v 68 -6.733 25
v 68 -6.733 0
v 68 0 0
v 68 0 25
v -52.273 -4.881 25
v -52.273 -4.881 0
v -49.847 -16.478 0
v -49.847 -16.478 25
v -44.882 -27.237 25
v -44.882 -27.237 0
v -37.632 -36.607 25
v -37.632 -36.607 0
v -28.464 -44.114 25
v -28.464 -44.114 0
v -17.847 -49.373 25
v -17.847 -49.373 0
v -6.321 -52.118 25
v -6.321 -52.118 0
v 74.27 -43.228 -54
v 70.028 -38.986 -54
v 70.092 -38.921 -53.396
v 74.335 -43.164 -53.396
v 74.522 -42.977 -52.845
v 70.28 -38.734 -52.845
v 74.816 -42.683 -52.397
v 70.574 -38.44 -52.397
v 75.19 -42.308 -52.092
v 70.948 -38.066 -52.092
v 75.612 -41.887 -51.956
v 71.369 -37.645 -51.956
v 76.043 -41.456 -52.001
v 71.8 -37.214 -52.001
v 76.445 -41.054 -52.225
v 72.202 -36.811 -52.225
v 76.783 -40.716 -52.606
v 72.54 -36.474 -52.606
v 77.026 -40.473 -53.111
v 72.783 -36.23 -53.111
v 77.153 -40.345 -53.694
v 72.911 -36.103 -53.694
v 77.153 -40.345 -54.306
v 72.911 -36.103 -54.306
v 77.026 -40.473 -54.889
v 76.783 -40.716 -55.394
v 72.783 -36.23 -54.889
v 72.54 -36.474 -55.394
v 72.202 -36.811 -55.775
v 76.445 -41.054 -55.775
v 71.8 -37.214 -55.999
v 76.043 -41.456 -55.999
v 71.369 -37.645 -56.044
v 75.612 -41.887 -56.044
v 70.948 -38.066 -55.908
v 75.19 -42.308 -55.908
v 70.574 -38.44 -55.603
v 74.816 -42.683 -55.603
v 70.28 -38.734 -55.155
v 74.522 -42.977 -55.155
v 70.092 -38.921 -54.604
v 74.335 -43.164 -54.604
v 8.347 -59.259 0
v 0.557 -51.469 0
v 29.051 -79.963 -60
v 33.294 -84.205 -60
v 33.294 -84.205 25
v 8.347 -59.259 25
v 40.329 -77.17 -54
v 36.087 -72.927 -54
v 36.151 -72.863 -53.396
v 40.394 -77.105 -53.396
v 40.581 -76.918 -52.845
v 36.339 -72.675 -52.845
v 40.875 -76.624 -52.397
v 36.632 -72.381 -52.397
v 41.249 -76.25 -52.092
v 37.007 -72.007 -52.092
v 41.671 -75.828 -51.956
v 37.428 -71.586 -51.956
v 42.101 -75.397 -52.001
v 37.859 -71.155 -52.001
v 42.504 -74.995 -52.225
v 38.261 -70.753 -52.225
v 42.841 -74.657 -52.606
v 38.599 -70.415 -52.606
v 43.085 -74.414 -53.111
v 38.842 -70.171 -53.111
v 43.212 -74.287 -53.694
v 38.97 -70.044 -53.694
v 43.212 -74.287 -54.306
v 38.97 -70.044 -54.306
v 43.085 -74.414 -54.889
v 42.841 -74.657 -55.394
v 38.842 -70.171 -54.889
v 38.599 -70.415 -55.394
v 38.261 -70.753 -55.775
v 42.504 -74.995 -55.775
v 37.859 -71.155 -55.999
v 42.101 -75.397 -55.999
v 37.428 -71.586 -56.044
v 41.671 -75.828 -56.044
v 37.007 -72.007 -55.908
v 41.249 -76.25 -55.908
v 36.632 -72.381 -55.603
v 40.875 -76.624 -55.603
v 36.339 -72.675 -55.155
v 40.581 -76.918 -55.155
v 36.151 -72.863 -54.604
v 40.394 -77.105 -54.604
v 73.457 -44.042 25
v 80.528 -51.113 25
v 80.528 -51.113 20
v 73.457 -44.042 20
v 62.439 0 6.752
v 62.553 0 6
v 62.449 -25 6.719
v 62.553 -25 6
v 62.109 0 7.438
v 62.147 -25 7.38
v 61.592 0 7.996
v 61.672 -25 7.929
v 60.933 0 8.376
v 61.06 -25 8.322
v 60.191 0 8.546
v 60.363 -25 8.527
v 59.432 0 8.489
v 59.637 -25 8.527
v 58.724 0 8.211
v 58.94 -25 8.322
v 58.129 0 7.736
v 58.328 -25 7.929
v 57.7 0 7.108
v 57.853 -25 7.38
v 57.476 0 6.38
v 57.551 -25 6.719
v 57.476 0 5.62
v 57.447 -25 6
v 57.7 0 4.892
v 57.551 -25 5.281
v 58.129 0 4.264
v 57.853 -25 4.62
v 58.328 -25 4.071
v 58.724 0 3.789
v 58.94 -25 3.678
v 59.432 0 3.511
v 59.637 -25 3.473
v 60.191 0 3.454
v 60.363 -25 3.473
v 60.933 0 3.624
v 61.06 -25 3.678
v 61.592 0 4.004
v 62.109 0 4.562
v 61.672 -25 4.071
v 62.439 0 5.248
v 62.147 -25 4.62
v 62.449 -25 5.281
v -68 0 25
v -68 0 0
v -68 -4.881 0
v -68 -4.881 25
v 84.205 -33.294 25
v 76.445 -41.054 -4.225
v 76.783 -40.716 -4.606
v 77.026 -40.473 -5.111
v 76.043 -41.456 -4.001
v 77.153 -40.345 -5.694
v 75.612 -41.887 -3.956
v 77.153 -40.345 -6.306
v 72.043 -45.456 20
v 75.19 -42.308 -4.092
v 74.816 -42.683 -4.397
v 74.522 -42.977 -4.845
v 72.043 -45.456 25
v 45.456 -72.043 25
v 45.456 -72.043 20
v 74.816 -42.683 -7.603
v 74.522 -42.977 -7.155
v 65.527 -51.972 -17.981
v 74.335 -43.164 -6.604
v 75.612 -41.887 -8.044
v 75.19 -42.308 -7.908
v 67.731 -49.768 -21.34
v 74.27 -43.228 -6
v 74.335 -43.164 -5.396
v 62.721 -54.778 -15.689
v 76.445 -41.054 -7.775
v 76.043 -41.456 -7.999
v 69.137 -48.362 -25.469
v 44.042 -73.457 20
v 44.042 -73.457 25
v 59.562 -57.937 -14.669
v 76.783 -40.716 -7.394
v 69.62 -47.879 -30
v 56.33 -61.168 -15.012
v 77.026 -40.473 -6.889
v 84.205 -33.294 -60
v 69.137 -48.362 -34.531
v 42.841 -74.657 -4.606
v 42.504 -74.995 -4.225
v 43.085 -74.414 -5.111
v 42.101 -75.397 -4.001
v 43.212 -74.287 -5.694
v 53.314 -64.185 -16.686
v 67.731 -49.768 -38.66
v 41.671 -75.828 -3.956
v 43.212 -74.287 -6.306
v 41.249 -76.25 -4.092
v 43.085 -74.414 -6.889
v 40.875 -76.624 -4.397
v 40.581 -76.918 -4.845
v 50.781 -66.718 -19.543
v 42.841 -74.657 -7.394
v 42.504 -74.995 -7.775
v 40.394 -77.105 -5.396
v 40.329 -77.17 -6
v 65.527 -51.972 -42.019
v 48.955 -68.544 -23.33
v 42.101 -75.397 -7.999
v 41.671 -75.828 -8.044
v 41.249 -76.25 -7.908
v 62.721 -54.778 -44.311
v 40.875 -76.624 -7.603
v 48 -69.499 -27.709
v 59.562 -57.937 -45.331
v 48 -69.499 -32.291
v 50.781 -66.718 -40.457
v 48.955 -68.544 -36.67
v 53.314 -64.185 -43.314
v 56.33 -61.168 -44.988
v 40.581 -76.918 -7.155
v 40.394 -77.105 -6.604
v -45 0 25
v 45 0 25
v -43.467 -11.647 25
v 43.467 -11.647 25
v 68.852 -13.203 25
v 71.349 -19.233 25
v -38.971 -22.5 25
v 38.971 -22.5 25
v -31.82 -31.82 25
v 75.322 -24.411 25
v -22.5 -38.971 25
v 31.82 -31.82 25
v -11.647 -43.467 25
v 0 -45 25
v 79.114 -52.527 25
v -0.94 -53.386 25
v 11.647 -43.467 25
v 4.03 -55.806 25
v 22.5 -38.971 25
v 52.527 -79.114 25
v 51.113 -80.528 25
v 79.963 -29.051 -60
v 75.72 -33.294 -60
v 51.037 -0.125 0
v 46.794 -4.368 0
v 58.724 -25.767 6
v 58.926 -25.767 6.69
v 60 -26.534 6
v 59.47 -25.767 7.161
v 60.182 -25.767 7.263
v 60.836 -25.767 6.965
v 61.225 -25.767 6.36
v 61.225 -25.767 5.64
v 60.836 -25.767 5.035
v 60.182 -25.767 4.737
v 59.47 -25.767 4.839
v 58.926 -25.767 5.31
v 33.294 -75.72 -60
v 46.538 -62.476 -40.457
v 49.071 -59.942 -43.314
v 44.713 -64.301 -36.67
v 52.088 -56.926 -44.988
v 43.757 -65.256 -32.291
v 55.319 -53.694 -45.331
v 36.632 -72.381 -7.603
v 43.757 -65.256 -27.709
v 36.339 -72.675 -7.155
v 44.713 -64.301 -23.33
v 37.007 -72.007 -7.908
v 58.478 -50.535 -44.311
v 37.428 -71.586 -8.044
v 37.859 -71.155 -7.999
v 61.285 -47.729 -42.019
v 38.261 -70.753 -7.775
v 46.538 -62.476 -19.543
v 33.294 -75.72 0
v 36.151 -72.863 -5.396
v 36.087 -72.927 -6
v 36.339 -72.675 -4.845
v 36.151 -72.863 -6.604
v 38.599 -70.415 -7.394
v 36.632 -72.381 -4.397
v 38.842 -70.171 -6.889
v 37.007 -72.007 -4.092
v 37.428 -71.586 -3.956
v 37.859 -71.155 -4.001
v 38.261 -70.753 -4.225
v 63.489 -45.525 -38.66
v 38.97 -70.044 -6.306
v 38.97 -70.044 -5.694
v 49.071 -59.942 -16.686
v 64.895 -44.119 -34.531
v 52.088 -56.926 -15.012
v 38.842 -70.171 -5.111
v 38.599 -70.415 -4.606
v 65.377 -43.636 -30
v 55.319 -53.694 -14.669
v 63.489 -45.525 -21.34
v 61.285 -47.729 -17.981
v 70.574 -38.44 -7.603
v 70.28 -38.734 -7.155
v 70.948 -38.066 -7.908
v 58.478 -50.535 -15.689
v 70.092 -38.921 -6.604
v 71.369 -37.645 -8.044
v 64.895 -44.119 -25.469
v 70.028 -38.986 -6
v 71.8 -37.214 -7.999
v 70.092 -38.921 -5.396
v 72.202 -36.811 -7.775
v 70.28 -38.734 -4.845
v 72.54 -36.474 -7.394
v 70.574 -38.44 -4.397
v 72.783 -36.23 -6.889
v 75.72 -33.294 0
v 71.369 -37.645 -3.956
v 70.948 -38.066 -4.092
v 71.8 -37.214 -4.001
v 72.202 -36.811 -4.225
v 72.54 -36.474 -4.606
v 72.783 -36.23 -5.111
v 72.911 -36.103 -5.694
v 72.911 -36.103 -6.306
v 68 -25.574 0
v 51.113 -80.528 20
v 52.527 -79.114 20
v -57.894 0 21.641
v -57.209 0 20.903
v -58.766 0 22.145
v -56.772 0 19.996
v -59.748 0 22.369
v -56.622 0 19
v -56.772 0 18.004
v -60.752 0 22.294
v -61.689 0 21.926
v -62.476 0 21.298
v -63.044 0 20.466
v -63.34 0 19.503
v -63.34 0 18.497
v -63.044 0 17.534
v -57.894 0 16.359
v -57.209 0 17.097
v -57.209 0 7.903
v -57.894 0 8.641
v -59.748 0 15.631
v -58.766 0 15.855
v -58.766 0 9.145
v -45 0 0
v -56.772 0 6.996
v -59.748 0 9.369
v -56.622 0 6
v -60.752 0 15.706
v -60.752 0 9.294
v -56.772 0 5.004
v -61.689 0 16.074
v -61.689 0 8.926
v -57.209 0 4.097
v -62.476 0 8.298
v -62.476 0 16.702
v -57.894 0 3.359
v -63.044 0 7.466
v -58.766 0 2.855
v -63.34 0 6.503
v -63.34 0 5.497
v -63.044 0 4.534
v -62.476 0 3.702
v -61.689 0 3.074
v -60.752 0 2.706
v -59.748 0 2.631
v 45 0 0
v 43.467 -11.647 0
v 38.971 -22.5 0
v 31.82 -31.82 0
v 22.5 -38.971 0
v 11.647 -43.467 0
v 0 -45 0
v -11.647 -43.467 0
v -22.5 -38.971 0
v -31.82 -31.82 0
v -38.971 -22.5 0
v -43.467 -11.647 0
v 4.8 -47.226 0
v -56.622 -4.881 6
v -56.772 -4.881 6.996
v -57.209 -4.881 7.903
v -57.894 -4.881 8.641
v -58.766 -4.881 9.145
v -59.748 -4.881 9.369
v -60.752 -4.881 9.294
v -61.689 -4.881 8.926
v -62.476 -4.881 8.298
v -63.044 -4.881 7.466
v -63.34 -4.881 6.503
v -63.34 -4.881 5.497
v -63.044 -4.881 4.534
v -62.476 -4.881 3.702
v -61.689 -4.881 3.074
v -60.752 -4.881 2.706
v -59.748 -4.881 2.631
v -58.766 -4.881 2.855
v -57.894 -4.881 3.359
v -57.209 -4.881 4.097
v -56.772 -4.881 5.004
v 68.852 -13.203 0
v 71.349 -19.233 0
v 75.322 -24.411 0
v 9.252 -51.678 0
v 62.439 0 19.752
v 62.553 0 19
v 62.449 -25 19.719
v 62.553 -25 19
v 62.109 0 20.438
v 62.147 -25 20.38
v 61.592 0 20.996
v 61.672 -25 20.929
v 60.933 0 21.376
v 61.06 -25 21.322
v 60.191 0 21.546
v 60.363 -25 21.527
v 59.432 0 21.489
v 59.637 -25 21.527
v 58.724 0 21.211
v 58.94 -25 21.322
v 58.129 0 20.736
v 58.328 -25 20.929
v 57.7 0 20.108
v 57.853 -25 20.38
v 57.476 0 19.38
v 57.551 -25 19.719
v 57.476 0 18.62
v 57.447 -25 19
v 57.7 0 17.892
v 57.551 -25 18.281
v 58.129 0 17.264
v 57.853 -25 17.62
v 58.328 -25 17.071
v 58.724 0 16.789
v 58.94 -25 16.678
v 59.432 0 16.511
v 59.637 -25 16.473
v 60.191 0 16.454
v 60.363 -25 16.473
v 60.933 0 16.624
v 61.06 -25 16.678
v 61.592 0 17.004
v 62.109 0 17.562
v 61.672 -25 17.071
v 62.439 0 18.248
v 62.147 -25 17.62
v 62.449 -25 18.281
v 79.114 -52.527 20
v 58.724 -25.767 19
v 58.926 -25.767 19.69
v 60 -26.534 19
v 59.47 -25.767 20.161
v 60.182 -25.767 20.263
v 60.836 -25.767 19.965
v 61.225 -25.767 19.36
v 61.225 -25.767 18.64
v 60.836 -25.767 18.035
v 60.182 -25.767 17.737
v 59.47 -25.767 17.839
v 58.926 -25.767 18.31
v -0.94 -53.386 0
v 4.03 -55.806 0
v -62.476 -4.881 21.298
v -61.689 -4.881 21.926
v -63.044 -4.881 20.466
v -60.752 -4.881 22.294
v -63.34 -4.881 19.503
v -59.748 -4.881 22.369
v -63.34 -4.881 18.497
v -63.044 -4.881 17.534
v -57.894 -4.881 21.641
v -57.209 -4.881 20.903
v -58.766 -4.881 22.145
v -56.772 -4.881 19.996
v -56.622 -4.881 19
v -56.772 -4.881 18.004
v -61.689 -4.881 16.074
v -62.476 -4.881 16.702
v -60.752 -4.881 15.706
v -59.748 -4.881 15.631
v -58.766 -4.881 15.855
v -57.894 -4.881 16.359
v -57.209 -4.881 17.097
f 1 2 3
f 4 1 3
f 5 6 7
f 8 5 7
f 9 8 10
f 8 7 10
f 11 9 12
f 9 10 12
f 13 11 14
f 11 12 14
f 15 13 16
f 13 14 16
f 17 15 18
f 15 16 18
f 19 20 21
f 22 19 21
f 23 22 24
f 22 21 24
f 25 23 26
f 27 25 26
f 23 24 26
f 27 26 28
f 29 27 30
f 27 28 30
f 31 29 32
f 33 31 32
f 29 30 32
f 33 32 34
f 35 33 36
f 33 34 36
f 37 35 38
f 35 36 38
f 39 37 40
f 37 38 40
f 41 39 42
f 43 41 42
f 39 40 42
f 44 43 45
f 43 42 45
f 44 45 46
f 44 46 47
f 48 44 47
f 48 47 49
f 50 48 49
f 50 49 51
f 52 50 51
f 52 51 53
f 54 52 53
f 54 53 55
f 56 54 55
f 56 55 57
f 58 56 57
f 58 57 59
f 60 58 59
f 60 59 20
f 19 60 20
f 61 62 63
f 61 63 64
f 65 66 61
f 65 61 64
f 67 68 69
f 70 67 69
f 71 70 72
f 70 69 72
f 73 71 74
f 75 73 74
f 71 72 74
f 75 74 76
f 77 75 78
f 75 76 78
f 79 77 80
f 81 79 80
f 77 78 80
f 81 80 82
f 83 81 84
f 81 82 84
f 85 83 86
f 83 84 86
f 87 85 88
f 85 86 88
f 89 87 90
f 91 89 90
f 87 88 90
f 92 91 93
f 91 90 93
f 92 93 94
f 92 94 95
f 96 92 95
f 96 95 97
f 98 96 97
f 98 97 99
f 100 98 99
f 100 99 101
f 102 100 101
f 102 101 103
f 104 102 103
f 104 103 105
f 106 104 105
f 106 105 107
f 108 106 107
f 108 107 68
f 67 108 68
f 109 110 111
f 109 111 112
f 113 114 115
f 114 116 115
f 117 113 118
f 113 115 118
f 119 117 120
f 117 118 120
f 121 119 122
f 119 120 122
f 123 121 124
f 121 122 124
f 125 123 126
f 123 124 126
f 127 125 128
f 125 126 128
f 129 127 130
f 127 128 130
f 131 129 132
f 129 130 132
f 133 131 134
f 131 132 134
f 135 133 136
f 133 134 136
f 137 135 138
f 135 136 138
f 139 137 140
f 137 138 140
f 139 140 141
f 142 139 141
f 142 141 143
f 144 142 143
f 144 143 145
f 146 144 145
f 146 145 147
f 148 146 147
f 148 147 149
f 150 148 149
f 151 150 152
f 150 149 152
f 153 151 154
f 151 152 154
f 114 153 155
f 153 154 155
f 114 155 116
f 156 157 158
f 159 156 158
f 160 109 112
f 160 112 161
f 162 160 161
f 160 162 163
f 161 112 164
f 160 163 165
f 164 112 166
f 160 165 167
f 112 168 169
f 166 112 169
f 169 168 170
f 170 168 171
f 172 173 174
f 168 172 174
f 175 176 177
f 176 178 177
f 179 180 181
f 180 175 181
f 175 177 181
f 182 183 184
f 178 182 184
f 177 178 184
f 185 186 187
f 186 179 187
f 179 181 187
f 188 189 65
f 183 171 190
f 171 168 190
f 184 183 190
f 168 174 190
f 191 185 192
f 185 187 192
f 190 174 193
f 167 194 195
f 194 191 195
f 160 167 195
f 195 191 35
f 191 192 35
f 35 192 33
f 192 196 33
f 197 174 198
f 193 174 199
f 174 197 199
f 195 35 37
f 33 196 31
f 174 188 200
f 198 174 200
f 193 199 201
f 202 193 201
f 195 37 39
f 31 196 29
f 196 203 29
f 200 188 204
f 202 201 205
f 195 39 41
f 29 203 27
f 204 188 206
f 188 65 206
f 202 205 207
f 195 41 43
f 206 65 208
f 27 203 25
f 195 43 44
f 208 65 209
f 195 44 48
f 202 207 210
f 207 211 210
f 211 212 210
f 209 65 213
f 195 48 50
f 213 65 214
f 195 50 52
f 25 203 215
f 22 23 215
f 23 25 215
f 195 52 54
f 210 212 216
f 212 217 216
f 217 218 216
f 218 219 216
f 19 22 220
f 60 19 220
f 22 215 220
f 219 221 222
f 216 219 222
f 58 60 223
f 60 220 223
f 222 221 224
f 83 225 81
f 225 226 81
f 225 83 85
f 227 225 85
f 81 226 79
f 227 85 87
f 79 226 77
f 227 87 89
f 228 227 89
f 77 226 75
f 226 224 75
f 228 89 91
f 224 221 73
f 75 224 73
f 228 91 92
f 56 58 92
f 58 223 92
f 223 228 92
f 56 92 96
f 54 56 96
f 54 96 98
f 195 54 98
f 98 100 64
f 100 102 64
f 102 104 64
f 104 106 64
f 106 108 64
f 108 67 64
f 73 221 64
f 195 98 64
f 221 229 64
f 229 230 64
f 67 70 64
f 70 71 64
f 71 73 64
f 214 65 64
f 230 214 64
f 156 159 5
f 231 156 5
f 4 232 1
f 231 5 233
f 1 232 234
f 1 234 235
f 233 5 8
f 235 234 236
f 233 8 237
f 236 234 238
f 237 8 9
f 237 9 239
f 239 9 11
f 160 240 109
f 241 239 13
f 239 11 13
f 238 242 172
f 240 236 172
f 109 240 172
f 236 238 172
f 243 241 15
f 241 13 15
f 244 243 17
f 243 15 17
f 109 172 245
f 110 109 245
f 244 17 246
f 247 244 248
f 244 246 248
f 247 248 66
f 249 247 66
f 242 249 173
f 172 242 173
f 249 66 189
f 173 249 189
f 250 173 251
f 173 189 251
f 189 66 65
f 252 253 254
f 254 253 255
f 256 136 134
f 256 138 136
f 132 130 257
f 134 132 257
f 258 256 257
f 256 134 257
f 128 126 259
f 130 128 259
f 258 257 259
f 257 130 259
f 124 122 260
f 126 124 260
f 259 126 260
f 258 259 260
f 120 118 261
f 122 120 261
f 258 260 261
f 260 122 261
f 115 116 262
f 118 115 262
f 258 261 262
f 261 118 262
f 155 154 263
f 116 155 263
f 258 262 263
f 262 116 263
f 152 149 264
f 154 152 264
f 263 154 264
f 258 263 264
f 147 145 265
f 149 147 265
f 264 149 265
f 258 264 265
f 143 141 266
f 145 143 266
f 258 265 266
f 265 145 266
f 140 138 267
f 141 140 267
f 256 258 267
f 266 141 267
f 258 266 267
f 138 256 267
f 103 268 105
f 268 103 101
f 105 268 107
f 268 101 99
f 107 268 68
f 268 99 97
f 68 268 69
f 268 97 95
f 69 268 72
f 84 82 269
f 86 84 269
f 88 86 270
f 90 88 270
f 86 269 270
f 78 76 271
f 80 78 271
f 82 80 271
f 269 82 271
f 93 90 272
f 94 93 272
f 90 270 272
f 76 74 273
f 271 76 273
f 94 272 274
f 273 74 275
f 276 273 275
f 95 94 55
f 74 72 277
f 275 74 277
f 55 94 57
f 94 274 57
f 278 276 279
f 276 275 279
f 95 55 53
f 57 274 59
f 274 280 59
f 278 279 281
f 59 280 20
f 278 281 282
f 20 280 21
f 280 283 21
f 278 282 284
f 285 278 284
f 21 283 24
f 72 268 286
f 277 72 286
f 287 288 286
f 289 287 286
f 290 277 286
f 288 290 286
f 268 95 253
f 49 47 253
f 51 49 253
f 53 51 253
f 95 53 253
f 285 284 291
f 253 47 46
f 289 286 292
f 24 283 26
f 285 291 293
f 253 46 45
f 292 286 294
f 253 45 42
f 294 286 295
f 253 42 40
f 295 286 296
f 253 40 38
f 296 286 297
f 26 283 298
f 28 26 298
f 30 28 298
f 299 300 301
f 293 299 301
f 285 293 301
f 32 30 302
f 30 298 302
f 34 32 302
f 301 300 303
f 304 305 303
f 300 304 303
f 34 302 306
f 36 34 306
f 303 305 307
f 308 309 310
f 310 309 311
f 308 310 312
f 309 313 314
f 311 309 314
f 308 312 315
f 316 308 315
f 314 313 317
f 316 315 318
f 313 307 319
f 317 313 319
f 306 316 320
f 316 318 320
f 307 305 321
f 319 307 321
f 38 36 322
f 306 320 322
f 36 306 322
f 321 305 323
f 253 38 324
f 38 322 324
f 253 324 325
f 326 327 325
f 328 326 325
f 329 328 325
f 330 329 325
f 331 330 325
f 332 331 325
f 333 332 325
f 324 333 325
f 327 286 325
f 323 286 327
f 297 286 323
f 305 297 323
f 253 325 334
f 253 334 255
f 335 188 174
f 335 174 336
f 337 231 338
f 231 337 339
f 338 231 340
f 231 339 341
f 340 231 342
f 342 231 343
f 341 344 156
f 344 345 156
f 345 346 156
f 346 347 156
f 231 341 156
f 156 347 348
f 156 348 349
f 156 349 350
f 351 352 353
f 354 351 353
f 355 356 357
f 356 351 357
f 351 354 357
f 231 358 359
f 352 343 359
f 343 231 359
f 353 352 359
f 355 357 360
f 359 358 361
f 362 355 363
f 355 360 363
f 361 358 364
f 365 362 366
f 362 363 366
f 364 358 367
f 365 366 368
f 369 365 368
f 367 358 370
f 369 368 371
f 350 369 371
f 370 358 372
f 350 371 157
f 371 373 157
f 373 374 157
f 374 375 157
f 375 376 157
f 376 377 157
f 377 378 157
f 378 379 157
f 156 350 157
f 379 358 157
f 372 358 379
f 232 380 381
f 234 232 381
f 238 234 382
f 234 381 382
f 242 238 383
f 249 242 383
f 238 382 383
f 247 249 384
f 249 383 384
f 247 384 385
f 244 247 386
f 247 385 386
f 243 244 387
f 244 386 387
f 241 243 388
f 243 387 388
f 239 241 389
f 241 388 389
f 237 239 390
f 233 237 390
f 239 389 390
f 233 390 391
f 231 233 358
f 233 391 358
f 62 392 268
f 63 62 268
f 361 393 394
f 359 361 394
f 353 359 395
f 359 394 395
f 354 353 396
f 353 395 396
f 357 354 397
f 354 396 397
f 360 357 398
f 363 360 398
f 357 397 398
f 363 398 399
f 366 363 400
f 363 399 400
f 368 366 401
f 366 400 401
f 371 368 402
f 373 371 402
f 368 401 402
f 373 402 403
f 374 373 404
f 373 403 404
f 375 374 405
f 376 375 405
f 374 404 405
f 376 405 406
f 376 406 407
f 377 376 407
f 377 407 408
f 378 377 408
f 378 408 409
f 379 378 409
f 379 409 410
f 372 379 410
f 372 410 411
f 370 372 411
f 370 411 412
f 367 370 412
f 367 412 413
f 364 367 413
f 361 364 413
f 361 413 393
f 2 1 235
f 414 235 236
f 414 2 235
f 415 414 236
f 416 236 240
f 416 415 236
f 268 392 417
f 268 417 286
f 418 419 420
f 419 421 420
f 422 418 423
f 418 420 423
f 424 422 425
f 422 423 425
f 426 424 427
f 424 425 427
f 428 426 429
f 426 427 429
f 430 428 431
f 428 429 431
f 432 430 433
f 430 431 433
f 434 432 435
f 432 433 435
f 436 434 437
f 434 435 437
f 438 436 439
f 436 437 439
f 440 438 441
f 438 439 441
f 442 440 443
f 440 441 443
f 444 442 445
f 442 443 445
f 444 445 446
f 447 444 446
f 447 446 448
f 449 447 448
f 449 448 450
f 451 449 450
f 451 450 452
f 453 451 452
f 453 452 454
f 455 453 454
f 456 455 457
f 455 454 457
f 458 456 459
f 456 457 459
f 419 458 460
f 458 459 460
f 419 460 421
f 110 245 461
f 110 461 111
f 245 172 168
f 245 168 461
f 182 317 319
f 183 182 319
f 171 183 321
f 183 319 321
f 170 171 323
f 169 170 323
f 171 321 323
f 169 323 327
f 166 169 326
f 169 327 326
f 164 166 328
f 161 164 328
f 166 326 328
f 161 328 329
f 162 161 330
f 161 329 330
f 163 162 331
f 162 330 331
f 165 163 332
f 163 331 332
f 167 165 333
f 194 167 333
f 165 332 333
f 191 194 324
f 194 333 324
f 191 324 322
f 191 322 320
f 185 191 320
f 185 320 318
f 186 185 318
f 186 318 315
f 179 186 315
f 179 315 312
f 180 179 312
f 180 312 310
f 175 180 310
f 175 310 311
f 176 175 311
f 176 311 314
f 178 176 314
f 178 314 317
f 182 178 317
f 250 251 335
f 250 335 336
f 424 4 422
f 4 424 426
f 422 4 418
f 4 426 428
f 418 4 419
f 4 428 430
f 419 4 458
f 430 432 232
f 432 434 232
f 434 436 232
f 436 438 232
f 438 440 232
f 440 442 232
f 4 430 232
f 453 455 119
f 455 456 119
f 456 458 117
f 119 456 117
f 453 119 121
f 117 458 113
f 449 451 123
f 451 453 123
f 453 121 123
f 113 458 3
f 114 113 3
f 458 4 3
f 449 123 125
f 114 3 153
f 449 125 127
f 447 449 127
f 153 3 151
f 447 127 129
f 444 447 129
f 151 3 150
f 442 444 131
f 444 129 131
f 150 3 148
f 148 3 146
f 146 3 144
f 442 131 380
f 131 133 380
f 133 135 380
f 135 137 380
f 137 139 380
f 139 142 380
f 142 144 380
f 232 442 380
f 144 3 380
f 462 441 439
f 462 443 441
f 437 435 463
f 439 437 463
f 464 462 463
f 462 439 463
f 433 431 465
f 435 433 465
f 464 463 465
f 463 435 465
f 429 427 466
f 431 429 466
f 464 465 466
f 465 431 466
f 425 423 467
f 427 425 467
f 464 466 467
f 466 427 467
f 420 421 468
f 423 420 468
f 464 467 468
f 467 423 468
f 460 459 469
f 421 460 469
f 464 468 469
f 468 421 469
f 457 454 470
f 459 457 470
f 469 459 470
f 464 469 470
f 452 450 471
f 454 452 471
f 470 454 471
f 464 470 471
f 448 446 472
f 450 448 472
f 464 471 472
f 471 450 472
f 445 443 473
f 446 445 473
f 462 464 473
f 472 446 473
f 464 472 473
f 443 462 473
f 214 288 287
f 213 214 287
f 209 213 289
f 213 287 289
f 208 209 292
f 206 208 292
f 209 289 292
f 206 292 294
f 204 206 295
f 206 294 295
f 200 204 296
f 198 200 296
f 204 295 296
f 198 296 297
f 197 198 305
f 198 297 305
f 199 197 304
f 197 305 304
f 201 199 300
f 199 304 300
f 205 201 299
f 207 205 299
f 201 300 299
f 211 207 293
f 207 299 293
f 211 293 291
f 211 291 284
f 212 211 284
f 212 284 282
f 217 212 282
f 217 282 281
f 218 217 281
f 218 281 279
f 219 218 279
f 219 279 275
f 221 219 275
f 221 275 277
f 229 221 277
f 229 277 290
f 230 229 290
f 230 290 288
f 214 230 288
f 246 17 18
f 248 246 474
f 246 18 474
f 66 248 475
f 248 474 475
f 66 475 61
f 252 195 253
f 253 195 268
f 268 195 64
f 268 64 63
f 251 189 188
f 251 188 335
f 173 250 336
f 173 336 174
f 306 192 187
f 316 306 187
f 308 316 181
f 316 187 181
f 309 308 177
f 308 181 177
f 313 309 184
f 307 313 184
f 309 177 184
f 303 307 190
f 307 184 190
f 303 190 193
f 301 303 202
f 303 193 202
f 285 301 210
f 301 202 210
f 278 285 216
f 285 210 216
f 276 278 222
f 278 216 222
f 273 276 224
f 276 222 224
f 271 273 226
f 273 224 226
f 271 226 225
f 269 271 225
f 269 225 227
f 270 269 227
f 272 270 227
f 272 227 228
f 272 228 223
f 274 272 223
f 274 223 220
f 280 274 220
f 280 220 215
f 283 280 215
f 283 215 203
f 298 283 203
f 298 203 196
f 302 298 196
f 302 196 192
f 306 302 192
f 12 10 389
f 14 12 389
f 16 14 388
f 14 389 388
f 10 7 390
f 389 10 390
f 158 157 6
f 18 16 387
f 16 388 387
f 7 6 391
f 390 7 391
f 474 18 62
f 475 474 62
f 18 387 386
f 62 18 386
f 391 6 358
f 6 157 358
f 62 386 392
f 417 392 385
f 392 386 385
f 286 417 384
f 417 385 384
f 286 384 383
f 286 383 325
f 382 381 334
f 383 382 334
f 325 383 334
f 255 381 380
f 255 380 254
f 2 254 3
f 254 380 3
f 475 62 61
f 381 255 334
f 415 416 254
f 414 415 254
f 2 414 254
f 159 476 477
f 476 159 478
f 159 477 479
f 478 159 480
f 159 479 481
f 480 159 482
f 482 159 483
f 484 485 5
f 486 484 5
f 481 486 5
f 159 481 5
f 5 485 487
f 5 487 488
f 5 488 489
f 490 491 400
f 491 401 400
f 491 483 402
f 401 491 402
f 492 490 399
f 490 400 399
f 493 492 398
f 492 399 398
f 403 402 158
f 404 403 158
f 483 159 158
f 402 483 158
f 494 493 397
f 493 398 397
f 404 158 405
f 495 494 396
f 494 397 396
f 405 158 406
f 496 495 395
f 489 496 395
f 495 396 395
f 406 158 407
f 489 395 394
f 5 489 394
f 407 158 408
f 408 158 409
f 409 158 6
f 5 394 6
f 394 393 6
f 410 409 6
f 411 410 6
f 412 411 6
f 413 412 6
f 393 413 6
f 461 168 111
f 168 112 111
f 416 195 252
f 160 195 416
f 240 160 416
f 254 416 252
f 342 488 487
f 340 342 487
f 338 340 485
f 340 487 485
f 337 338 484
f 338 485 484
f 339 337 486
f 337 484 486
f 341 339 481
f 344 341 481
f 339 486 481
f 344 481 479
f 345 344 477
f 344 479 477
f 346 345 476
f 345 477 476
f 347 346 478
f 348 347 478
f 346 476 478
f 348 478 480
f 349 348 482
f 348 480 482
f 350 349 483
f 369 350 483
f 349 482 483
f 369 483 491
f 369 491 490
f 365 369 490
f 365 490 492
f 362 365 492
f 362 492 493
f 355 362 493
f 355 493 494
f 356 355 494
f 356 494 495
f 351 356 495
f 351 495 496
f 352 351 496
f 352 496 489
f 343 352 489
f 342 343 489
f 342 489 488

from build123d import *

# Parameters (mm, degrees)
F1_DEPTH  = 25
F3_DEPTH  = 60
F4_R      = 15.3734931233
F5_DEPTH  = 131.1684809697
F8_DEPTH  = 6
F10_DEPTH = 6
F11_R     = 25
F12_R     = 25
F14_D     = 5.1054
F14_DEPTH = 25
F14_TIP   = 1.5338169022
F15_D     = 6.7564
F15_DEPTH = 25
F15_TIP   = 2.0298273432
F16_D     = 4.1
F16_DEPTH = 25
F16_TIP   = 1.231764269
F18_DEPTH = 5


with BuildPart() as f1:
    # F0 (on Top) → F1 (new body)
    with BuildSketch(Plane.XY):
        with BuildLine():
            ThreePointArc((45, 0), (0, -45), (-45, 0))
            Line((-45, 0), (-68, 0))
            Line((-68, 0), (-68, -4.880737979))
            Line((-68, -4.880737979), (-52.2726352577, -4.880737979))
            ThreePointArc((-52.2726352577, -4.880737979), (-31.783629524, -41.7857738265), (9.2519405818, -51.678347453))
            Line((9.2519405818, -51.678347453), (37.5362118293, -79.9626187004))
            Line((37.5362118293, -79.9626187004), (79.9626187004, -37.5362118293))
            Line((79.9626187004, -37.5362118293), (68, -25.5735931288))
            Line((68, -25.5735931288), (68, 0))
            Line((68, 0), (45, 0))
        make_face()
    extrude(amount=F1_DEPTH)

    # F2 (on face) → F3 (join)
    with BuildSketch(Plane(origin=(0, 0, 0), x_dir=(1, 0, 0), z_dir=(0, 0, -1))):
        Polygon((79.9626187004, 37.5362118293), (37.5362118293, 79.9626187004), (33.2935711421, 75.7199780133), (75.7199780133, 33.2935711421), align=None)
    extrude(amount=F3_DEPTH)

    # F4 (on face) → F5 (cut, through all)
    with BuildSketch(Plane(origin=(58.7494152648, -58.7494152648, 0), x_dir=(0.7071067812, 0.7071067812, 0), z_dir=(0.7071067812, -0.7071067812, 0))):
        with Locations((0, -30)):
            Circle(F4_R)
    extrude(amount=-F5_DEPTH, mode=Mode.SUBTRACT)

    # F7 (on face) → F8 (join)
    with BuildSketch(Plane(origin=(-21.2132034356, -21.2132034356, 0), x_dir=(0.7071067812, -0.7071067812, 0), z_dir=(-0.7071067812, -0.7071067812, 0))):
        Polygon((83.084219849, -60), (83.084219849, 25), (36.7878936231, 25), (36.7878936231, 0), (77.084219849, -60), align=None)
    extrude(amount=F8_DEPTH)

    # F9 (on face) → F10 (join)
    with BuildSketch(Plane(origin=(21.2132034356, 21.2132034356, 0), x_dir=(-0.7071067812, 0.7071067812, 0), z_dir=(0.7071067812, 0.7071067812, 0))):
        Polygon((-83.084219849, 25), (-83.084219849, -60), (-77.084219849, -60), (-36.1771658063, 0), (-36.1771658063, 25), align=None)
    extrude(amount=F10_DEPTH)

    # F11
    f11_edges = [f1.edges().sort_by_distance(p)[0] for p in [
        (1.564981, -52.476669, 12.5),
    ]]
    fillet(f11_edges, radius=F11_R)

    # F12
    f12_edges = [f1.edges().sort_by_distance(p)[0] for p in [
        (68, -17.088312, 12.5),
    ]]
    fillet(f12_edges, radius=F12_R)

    # F14
    with Locations(Plane(origin=(0, 0, 0), x_dir=(-1, 0, 0), z_dir=(0, 1, 0))):
        with Locations((-60, 6), (-60, 19)):
            Hole(F14_D / 2, depth=F14_DEPTH)
            with Locations((0, 0, -(F14_DEPTH + F14_TIP / 2))):  # 118° drill point
                Cone(0, F14_D / 2, F14_TIP, mode=Mode.SUBTRACT)

    # F15
    with Locations(Plane(origin=(0, 0, 0), x_dir=(-1, 0, 0), z_dir=(0, 1, 0))):
        with Locations((60, 6), (60, 19)):
            Hole(F15_D / 2, depth=F15_DEPTH)
            with Locations((0, 0, -(F15_DEPTH + F15_TIP / 2))):  # 118° drill point
                Cone(0, F15_D / 2, F15_TIP, mode=Mode.SUBTRACT)

    # F16
    with Locations(Plane(origin=(58.7494152648, -58.7494152648, 0), x_dir=(0.7071067812, 0.7071067812, 0), z_dir=(0.7071067812, -0.7071067812, 0))):
        with Locations((-24, -6), (24, -6), (24, -54), (-24, -54)):
            Hole(F16_D / 2, depth=F16_DEPTH)
            with Locations((0, 0, -(F16_DEPTH + F16_TIP / 2))):  # 118° drill point
                Cone(0, F16_D / 2, F16_TIP, mode=Mode.SUBTRACT)

    # F17 (on face) → F18 (join)
    with BuildSketch(Plane.XY.offset(25)):
        Polygon((72.0430227512, -45.4558077785), (79.114090563, -52.5268755904), (80.5283041254, -51.112662028), (73.4572363135, -44.0415942162), align=None)
        Polygon((51.112662028, -80.5283041254), (52.5268755904, -79.114090563), (45.4558077785, -72.0430227512), (44.0415942162, -73.4572363135), align=None)
    extrude(amount=-F18_DEPTH)


solid = f1.part
